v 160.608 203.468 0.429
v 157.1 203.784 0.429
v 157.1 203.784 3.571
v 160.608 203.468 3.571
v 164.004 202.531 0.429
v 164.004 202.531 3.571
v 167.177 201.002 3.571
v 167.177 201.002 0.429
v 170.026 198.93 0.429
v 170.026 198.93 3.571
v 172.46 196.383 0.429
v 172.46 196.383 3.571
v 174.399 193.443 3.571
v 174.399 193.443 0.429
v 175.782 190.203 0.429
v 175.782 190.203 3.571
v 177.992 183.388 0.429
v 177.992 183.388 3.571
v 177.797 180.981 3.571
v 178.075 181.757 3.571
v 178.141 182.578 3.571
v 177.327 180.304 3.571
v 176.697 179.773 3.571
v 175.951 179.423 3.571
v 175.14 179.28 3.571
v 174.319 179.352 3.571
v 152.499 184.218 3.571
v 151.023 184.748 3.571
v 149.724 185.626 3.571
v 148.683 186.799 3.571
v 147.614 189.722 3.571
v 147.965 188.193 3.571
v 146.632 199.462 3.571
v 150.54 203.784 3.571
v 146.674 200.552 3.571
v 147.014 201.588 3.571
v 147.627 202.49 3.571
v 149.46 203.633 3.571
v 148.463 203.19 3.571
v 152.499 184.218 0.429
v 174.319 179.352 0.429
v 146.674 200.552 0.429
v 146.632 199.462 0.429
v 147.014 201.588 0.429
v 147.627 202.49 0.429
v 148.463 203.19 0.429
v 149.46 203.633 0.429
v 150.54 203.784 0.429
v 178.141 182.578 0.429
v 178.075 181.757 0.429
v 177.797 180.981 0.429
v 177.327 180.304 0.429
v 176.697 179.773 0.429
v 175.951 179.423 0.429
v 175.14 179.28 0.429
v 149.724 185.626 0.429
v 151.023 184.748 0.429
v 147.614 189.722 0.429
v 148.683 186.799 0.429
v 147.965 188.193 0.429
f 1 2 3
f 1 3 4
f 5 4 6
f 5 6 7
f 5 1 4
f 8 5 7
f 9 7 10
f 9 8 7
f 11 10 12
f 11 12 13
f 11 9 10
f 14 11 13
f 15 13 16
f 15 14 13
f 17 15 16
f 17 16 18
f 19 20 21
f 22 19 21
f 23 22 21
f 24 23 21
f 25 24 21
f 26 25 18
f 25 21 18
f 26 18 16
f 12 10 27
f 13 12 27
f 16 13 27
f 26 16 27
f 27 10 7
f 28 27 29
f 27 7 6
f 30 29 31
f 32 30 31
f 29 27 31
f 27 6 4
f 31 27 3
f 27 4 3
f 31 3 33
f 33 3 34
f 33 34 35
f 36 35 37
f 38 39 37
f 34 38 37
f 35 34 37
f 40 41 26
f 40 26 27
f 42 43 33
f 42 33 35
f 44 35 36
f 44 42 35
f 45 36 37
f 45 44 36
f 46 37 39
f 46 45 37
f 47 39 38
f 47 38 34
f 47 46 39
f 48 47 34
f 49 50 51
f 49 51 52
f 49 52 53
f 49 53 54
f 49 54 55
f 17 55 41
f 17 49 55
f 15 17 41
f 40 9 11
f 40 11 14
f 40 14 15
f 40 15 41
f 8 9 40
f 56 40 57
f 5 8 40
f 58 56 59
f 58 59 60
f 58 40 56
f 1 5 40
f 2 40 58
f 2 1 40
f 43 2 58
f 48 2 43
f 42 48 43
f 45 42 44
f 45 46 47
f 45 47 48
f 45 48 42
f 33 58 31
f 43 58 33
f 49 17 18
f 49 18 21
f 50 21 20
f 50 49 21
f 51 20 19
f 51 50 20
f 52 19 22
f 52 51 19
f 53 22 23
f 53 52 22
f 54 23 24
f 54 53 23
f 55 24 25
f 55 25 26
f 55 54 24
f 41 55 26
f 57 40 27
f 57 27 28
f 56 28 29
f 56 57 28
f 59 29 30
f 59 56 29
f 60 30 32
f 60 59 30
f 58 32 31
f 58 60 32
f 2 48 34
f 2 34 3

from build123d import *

# Parameters (mm, degrees)
BOSS_EXTRUDE1_DEPTH = 4
SCALE1_SCALE        = 0.709677419
SCALE2_SCALE        = 1.107011


with BuildPart() as part:
    # Sketch1 → Boss-Extrude1 (new body)
    with BuildSketch(Plane.XY):
        with BuildLine():
            Line((147.518542688, 207.036750067), (155.868006274, 207.036750067))
            ThreePointArc((155.868006274, 207.036750067), (170.568083888, 202.258216832), (179.648576747, 189.749367518))
            Line((179.648576747, 189.749367518), (182.461666016, 181.075675605))
            ThreePointArc((182.461666016, 181.075675605), (181.615221362, 177.149521305), (177.786078934, 175.937570644))
            Line((177.786078934, 175.937570644), (150.012503839, 182.131679667))
            ThreePointArc((150.012503839, 182.131679667), (145.770913066, 184.629115543), (143.794281074, 189.137020178))
            Line((143.794281074, 189.137020178), (142.543783701, 201.534980175))
            ThreePointArc((142.543783701, 201.534980175), (143.809846862, 205.390192369), (147.518542688, 207.036750067))
        make_face()
    extrude(amount=BOSS_EXTRUDE1_DEPTH)


with BuildPart() as part_1:
    # Scale1: scaled about (161.61313874, 191.864088439, 2)
    add(part.part.scale(SCALE1_SCALE).moved(Location((46.919943505, 55.702477289, 0.580645161))))


with BuildPart() as part_2:
    # Scale2: scaled about (161.61313874, 191.864088439, 2)
    add(part_1.part.scale(SCALE2_SCALE).moved(Location((-17.29438359, -20.531567968, -0.214022))))


solid = part_2.part
